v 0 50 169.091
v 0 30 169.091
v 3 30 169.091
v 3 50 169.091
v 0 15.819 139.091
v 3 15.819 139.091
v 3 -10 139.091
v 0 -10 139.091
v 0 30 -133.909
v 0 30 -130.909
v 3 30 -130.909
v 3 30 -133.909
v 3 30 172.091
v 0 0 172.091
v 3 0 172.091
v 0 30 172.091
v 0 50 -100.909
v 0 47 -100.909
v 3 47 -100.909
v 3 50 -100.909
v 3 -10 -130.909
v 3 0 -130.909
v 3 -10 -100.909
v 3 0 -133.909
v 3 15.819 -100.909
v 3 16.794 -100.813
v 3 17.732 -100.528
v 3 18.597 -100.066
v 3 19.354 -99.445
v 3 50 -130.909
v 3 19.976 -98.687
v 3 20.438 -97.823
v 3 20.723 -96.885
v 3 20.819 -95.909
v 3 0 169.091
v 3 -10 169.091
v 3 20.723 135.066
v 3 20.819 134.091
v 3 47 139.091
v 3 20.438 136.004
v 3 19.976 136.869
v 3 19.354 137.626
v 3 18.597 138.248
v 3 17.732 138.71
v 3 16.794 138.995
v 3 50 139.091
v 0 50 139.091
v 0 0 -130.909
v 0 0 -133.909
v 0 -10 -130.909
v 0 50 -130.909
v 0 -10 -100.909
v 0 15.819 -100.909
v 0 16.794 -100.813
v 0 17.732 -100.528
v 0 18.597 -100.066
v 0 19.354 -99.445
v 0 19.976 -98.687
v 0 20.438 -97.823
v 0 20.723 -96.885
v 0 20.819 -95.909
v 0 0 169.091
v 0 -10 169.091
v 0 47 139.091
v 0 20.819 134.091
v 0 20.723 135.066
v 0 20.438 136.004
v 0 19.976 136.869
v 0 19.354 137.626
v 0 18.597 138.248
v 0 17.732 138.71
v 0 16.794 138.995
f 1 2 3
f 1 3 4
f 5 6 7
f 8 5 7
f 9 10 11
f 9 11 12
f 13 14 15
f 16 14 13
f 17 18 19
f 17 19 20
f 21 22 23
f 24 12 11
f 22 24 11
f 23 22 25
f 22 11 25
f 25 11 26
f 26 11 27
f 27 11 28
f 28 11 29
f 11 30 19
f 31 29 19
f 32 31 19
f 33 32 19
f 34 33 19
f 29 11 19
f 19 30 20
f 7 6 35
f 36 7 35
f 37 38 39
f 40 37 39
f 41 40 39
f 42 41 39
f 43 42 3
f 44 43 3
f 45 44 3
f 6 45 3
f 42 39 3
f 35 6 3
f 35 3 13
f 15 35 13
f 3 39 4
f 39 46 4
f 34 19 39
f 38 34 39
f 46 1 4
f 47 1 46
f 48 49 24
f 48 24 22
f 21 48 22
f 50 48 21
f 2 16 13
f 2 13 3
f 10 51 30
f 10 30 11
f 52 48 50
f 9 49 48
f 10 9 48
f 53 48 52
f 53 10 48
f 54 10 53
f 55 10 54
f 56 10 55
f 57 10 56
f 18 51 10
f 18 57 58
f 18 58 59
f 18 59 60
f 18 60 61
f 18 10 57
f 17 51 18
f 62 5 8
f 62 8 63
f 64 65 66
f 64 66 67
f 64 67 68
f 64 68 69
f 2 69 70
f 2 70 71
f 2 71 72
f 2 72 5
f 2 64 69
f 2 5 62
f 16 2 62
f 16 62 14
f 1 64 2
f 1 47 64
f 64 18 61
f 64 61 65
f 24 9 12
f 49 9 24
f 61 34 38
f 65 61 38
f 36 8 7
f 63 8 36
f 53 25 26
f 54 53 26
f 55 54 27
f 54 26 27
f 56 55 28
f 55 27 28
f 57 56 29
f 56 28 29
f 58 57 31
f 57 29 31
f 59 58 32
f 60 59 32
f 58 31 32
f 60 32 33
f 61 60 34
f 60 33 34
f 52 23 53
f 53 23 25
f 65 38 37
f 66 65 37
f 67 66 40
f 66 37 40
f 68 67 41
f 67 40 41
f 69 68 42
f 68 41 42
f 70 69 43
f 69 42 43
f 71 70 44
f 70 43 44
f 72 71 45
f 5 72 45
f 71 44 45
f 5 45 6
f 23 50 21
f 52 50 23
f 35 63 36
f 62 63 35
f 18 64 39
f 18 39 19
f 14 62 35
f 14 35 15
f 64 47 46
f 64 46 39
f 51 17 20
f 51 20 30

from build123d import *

# Parameters (mm, degrees)
BOSS_EXTRUDE1_DEPTH     = 3
CUT_EXTRUDE2_DEPTH      = 180.232477503
CUT_EXTRUDE2_DEPTH_BACK = 3


with BuildPart() as part:
    # Sketch1 → Boss-Extrude1 (new body)
    with BuildSketch(Plane(origin=(0, 0, 0), x_dir=(0, 0, -1), z_dir=(1, 0, 0))):
        Polygon((-169.090909091, 50), (-139.090909091, 50), (-139.090909091, 47), (100.909090909, 47), (100.909090909, 50), (130.909090909, 50), (130.909090909, 30), (133.909090909, 30), (133.909090909, 0), (130.909090909, 0), (130.909090909, -10), (-169.090909091, -10), (-169.090909091, 0), (-172.090909091, 0), (-172.090909091, 30), (-169.090909091, 30), align=None)
    extrude(amount=BOSS_EXTRUDE1_DEPTH)

    # Sketch2 → Cut-Extrude2 (cut, two sides: drawn at the far end of the back side and taken through both)
    with BuildSketch(Plane.ZY.offset(-CUT_EXTRUDE2_DEPTH_BACK)):
        with BuildLine():
            Line((-100.909090909, -579.031305027), (-100.909090909, -10))
            Line((-100.909090909, -10), (-100.909090909, 15.818953756))
            ThreePointArc((-100.909090909, 15.818953756), (-99.444624815, 19.354487662), (-95.909090909, 20.818953756))
            Line((-95.909090909, 20.818953756), (134.090909091, 20.818953756))
            ThreePointArc((134.090909091, 20.818953756), (137.626442997, 19.354487662), (139.090909091, 15.818953756))
            Line((139.090909091, 15.818953756), (139.090909091, -10))
            Line((139.090909091, -10), (139.090909091, -579.031305027))
            Line((139.090909091, -579.031305027), (139.090909091, -1717.09391508))
            Line((139.090909091, -1717.09391508), (-100.909090909, -1717.09391508))
            Line((-100.909090909, -1717.09391508), (-100.909090909, -579.031305027))
        make_face()
    extrude(amount=CUT_EXTRUDE2_DEPTH + CUT_EXTRUDE2_DEPTH_BACK, mode=Mode.SUBTRACT)


solid = part.part
